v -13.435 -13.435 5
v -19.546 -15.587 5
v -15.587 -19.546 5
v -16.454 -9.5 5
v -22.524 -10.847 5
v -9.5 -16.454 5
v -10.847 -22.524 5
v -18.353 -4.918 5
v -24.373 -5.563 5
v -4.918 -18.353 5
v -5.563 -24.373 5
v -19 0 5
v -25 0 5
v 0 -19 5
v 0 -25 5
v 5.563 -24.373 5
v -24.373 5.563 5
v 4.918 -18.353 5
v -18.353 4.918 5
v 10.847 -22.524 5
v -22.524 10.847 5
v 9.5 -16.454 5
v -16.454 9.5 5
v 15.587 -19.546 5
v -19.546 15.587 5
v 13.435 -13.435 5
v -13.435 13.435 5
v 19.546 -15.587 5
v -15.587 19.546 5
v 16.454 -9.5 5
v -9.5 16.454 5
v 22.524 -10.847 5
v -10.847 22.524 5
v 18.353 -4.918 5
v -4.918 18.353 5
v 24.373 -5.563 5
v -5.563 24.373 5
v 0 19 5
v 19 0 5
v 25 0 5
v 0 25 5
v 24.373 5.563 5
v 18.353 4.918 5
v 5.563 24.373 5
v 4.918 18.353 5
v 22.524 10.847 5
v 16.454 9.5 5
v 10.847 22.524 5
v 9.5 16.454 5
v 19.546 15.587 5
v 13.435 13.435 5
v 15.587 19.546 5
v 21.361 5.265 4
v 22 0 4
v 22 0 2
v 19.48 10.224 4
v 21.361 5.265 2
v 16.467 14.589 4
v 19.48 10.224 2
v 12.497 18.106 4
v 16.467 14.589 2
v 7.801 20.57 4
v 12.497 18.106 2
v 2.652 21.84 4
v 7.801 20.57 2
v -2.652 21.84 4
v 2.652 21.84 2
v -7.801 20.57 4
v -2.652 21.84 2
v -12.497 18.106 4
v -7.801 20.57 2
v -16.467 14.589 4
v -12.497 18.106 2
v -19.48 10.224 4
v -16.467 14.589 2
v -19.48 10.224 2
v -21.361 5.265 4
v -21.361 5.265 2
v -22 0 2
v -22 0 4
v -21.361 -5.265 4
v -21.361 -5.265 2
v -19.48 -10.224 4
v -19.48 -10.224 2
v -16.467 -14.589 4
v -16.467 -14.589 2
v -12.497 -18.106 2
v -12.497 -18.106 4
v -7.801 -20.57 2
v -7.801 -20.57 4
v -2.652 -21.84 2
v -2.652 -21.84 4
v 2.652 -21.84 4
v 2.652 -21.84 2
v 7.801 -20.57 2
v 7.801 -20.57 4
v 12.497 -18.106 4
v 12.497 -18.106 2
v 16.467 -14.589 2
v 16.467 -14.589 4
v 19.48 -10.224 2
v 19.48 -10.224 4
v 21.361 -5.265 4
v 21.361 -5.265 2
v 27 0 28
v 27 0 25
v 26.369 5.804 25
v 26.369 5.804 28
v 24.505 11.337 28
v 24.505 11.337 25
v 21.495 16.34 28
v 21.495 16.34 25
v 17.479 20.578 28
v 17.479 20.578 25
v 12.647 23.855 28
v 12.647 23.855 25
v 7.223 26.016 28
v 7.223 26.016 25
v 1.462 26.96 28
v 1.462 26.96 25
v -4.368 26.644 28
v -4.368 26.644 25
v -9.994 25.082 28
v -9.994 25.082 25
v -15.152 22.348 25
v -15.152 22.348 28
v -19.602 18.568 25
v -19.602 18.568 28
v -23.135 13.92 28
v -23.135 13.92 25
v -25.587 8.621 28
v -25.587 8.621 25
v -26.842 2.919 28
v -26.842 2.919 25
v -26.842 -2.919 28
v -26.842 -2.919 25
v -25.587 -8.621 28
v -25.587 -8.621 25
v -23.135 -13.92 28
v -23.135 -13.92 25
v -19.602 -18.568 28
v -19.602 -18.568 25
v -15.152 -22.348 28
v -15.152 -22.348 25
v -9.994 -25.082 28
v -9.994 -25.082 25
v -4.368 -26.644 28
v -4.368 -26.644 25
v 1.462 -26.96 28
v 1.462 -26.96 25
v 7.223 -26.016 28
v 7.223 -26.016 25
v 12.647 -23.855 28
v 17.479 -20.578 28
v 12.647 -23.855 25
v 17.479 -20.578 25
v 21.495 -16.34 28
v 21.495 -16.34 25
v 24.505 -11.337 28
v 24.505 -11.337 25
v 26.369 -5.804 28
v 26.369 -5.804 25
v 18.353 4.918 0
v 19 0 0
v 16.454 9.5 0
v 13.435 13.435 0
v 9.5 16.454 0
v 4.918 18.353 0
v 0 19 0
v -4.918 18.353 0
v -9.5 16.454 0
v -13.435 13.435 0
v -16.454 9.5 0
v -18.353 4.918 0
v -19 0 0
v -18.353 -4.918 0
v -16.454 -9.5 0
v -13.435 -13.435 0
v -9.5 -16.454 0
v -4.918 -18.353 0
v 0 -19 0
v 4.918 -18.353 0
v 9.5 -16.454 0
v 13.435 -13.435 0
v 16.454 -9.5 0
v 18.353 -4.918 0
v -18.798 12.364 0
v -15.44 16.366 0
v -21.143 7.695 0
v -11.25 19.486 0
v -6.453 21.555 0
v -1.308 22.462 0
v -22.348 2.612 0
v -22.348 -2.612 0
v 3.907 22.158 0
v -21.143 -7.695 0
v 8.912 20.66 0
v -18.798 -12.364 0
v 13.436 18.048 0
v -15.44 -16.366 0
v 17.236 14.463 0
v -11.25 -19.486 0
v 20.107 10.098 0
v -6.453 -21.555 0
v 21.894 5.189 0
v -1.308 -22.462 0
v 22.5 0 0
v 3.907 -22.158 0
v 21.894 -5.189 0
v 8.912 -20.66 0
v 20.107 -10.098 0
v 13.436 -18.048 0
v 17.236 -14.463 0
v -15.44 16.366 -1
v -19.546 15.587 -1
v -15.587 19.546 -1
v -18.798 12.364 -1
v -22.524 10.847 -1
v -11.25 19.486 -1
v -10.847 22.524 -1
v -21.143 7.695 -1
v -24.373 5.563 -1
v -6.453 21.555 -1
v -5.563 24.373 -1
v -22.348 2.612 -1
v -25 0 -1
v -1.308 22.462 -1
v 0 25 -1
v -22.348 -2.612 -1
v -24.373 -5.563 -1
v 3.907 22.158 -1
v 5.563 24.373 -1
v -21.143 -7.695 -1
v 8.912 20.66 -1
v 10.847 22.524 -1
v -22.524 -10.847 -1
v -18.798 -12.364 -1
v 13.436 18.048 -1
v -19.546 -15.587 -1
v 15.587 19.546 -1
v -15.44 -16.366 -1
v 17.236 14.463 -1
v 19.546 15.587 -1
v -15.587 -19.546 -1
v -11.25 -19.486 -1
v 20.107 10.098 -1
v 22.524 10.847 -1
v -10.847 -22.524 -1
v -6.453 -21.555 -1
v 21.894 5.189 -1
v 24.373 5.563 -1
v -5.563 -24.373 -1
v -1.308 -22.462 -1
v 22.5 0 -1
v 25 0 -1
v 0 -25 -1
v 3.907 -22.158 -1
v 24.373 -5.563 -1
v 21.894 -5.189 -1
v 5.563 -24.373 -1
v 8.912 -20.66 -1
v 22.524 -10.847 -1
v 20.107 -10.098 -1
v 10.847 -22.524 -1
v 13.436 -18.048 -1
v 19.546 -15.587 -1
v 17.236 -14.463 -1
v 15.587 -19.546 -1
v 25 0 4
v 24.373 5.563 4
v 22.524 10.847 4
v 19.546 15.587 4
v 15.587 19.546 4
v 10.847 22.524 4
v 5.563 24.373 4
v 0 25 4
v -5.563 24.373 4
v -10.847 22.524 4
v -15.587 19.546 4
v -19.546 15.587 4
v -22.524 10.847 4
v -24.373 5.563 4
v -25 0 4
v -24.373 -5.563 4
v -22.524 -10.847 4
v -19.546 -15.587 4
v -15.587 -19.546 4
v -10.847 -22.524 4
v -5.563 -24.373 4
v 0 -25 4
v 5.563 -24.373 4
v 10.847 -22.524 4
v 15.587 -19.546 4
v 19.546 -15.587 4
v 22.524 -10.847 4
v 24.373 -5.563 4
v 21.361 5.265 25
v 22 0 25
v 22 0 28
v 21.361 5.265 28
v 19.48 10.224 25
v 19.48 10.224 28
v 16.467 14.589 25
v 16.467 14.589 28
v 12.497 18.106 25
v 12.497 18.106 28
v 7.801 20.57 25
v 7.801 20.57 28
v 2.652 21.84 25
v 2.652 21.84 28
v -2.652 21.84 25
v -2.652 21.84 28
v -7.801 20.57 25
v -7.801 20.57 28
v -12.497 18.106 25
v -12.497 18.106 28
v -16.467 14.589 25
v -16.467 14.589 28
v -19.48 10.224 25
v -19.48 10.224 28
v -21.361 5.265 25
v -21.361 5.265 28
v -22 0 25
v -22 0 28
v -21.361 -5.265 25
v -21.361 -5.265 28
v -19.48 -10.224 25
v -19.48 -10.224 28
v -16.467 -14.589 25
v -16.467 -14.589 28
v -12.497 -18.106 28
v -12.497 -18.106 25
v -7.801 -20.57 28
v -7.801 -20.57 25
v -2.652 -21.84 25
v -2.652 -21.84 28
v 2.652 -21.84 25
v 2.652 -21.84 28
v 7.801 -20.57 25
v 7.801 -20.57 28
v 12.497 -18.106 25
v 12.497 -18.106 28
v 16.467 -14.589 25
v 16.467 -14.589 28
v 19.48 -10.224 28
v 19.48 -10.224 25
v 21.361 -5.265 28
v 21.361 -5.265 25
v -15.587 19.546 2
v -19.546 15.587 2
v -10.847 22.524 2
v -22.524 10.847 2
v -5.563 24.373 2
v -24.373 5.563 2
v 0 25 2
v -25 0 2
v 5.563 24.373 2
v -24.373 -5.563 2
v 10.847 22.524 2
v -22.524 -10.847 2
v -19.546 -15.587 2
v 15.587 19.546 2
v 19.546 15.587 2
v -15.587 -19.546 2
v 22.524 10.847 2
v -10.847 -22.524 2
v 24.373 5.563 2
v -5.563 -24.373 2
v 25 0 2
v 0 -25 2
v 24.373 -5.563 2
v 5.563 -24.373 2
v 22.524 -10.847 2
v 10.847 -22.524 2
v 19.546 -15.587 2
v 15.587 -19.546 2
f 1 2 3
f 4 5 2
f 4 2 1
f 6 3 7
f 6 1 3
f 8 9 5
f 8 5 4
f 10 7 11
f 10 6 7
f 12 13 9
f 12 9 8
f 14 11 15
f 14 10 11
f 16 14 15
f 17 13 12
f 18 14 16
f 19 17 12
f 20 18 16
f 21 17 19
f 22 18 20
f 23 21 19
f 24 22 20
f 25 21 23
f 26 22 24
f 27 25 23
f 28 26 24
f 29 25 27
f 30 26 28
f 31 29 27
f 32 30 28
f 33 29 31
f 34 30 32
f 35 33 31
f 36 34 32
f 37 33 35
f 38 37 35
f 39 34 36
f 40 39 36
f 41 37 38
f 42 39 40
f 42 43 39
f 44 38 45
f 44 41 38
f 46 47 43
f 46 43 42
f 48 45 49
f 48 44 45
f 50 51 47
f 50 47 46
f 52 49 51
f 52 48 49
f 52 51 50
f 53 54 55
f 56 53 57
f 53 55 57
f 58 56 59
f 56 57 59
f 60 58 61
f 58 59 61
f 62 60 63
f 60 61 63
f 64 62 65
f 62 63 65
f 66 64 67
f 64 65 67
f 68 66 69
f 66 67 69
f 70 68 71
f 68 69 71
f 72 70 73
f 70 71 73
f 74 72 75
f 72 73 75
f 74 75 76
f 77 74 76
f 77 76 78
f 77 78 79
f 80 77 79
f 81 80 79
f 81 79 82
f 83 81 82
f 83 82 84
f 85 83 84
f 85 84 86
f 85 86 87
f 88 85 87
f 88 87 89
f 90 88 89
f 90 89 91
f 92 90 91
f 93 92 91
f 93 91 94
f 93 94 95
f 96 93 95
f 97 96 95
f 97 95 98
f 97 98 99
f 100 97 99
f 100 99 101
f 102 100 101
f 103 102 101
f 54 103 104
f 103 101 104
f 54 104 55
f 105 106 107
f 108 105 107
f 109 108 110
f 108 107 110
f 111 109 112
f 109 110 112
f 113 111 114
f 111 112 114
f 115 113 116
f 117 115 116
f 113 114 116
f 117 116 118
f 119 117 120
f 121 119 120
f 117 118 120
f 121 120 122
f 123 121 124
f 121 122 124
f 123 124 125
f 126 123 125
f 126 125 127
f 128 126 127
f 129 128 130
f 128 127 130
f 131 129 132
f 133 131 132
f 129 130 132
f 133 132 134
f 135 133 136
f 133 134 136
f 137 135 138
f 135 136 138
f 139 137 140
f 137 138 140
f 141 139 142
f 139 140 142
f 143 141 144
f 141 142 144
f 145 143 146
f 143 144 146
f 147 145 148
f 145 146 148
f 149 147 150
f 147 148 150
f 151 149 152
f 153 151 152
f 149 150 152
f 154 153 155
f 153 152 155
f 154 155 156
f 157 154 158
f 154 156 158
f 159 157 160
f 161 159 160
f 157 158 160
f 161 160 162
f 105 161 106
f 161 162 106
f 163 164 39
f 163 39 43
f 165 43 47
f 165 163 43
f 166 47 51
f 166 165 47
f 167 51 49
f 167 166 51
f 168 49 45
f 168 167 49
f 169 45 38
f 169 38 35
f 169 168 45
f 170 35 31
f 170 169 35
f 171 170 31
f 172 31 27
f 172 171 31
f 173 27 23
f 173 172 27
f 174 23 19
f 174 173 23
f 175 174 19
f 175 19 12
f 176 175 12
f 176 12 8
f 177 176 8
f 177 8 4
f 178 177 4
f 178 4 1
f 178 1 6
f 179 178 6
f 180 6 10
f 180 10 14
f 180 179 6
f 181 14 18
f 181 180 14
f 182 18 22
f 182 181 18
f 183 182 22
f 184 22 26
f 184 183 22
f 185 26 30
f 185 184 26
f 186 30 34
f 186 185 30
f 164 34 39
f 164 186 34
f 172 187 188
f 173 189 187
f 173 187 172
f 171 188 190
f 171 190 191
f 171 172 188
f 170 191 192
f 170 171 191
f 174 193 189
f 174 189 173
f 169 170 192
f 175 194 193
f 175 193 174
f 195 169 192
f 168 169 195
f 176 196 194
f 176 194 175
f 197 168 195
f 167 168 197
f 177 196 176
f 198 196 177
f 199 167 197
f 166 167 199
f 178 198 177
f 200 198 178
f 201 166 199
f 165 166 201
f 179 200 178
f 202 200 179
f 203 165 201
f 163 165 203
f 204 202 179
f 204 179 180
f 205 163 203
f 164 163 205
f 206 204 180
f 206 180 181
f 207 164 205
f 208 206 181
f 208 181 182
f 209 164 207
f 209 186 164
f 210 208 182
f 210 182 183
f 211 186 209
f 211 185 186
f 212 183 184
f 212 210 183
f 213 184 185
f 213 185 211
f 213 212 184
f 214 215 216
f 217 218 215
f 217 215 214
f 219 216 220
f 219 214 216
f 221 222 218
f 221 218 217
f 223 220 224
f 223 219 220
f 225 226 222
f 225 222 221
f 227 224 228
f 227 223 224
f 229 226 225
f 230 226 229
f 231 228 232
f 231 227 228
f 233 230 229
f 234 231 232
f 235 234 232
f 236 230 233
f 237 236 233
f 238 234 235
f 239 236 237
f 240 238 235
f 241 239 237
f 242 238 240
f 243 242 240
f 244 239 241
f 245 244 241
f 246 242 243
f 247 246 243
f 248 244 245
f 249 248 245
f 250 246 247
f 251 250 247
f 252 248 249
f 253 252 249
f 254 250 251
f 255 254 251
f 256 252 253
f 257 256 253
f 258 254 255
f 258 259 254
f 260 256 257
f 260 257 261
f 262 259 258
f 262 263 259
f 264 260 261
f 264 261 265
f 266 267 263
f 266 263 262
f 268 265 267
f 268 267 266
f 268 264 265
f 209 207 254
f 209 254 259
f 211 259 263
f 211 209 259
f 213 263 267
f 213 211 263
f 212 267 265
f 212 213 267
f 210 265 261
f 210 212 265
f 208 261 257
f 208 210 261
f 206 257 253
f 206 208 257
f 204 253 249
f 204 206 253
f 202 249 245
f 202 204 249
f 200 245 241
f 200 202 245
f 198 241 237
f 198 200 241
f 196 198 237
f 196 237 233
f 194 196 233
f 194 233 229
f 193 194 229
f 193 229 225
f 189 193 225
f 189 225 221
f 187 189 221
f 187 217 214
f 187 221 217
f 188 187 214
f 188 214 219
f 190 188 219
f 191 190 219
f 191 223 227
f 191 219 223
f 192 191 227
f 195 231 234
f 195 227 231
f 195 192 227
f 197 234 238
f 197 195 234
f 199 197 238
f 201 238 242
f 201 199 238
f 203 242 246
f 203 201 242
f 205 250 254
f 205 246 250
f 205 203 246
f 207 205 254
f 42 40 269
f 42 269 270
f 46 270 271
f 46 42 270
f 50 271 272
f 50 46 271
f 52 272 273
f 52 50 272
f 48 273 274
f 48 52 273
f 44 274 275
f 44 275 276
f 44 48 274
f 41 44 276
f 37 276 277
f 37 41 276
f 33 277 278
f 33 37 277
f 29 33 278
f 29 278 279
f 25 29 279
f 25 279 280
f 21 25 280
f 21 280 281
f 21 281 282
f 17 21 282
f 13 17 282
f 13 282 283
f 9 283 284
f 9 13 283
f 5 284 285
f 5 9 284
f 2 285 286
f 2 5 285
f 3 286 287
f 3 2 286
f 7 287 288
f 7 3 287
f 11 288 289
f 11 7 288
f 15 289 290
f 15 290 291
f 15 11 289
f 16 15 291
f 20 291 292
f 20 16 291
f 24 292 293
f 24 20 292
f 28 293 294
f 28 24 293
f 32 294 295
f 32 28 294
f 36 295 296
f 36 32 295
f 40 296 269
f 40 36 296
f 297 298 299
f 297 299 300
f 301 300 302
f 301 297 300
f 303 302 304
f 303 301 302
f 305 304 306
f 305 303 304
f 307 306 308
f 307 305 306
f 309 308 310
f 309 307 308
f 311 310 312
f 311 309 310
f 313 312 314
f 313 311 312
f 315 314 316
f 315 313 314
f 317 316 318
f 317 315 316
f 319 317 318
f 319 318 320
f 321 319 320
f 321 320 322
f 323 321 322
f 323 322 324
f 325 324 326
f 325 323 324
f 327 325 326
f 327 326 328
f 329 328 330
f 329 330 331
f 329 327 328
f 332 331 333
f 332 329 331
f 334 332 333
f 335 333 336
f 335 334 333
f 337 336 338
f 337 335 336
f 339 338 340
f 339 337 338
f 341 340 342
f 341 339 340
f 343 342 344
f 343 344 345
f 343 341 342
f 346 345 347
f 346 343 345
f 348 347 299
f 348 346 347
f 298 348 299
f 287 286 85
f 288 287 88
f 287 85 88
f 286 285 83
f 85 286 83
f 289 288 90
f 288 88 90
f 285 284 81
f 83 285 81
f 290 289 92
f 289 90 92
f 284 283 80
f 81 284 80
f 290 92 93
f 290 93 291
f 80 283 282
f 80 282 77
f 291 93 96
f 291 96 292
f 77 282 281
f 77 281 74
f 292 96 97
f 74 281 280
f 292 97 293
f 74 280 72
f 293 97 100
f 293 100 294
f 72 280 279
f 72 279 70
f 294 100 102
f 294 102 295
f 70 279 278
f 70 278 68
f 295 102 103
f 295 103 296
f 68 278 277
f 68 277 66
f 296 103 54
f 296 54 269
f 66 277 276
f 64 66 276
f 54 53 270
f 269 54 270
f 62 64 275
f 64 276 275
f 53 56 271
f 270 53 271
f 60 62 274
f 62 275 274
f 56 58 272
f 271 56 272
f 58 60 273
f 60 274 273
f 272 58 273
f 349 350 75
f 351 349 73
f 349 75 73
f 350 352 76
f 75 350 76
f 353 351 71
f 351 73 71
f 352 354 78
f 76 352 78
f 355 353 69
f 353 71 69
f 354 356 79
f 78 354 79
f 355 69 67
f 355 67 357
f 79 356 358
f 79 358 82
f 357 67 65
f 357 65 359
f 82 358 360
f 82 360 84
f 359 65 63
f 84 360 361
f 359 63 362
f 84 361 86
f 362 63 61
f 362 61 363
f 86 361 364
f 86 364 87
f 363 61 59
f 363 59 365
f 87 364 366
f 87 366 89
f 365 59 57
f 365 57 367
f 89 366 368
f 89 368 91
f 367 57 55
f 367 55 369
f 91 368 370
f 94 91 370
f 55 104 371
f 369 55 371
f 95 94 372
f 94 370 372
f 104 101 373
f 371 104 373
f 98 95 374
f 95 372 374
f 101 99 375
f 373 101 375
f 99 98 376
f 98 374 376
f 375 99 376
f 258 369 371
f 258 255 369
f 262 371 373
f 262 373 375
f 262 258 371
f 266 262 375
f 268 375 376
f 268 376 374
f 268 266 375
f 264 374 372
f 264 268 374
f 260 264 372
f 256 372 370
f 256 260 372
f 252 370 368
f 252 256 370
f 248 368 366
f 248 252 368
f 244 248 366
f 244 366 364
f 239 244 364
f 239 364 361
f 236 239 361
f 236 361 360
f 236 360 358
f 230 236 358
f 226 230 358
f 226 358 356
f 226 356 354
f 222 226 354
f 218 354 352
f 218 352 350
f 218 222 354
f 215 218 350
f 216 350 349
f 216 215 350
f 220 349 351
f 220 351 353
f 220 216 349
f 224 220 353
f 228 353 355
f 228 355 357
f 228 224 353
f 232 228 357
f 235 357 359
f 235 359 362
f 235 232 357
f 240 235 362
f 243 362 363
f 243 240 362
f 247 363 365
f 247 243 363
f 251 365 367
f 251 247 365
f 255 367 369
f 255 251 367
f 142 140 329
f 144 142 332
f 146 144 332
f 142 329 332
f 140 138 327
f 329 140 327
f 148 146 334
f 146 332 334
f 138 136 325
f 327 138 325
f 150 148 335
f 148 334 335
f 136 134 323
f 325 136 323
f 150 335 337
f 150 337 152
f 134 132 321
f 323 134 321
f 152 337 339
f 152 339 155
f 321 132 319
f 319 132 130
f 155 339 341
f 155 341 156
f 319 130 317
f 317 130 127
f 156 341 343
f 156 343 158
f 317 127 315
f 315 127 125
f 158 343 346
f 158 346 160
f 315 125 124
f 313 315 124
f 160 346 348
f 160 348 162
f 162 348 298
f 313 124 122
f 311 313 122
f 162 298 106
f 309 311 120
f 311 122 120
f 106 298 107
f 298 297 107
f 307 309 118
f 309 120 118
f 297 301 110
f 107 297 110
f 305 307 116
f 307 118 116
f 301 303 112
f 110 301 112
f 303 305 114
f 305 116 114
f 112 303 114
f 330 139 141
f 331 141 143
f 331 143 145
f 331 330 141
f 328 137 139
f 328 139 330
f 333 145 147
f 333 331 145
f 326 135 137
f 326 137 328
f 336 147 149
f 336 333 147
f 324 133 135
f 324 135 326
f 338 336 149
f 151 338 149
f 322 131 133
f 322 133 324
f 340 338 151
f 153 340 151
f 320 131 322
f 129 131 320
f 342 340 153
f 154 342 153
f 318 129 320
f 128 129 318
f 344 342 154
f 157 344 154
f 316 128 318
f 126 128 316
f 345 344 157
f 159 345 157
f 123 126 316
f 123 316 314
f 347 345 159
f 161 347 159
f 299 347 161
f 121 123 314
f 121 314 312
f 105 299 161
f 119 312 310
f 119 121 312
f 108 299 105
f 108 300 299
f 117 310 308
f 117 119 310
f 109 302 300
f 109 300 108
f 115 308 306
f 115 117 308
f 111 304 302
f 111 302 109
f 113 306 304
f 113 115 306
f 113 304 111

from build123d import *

# Parameters (mm, degrees)
F0_R      = 22
F0_R_2    = 19
F1_DEPTH  = 5
F2_R      = 25
F2_R_2    = 22
F3_DEPTH  = 1
F4_R      = 25
F4_R_2    = 22
F4_R_3    = 21
F5_DEPTH  = 1
F6_DEPTH  = 2
F7_R      = 22.5
F8_DEPTH  = 4
F10_R     = 27
F10_R_2   = 22
F11_DEPTH = 3


with BuildPart() as f1:
    # F0 (on Top) → F1 (new body)
    with BuildSketch(Plane.XY):
        Circle(F0_R)
        Circle(F0_R_2, mode=Mode.SUBTRACT)
    extrude(amount=F1_DEPTH)

    # F2 (on face) → F3 (join)
    with BuildSketch(Plane.XY.offset(5)):
        Circle(F2_R)
        Circle(F2_R_2, mode=Mode.SUBTRACT)
    extrude(amount=-F3_DEPTH)

    # F4 (on face) → F5 (join)
    with BuildSketch(Plane(origin=(0, 0, 0), x_dir=(1, 0, 0), z_dir=(0, 0, -1))):
        Circle(F4_R)
        Circle(F4_R_2, mode=Mode.SUBTRACT)
        Circle(F4_R_2)
        Circle(F4_R_3, mode=Mode.SUBTRACT)
    extrude(amount=F5_DEPTH)

    # F4 (on face) → F6 (join)
    with BuildSketch(Plane(origin=(0, 0, 0), x_dir=(1, 0, 0), z_dir=(0, 0, -1))):
        Circle(F4_R)
        Circle(F4_R_2, mode=Mode.SUBTRACT)
    extrude(amount=-F6_DEPTH)

    # F7 (on face) → F8 (cut)
    with BuildSketch(Plane(origin=(0, 0, 0), x_dir=(1, 0, 0), z_dir=(0, 0, -1))):
        Circle(F7_R)
    extrude(amount=F8_DEPTH, mode=Mode.SUBTRACT)


with BuildPart() as f11:
    # F10 (on offset) → F11 (new body)
    with BuildSketch(Plane.XY.offset(25)):
        Circle(F10_R)
        Circle(F10_R_2, mode=Mode.SUBTRACT)
    extrude(amount=F11_DEPTH)


solid = Compound([f1.part, f11.part])
